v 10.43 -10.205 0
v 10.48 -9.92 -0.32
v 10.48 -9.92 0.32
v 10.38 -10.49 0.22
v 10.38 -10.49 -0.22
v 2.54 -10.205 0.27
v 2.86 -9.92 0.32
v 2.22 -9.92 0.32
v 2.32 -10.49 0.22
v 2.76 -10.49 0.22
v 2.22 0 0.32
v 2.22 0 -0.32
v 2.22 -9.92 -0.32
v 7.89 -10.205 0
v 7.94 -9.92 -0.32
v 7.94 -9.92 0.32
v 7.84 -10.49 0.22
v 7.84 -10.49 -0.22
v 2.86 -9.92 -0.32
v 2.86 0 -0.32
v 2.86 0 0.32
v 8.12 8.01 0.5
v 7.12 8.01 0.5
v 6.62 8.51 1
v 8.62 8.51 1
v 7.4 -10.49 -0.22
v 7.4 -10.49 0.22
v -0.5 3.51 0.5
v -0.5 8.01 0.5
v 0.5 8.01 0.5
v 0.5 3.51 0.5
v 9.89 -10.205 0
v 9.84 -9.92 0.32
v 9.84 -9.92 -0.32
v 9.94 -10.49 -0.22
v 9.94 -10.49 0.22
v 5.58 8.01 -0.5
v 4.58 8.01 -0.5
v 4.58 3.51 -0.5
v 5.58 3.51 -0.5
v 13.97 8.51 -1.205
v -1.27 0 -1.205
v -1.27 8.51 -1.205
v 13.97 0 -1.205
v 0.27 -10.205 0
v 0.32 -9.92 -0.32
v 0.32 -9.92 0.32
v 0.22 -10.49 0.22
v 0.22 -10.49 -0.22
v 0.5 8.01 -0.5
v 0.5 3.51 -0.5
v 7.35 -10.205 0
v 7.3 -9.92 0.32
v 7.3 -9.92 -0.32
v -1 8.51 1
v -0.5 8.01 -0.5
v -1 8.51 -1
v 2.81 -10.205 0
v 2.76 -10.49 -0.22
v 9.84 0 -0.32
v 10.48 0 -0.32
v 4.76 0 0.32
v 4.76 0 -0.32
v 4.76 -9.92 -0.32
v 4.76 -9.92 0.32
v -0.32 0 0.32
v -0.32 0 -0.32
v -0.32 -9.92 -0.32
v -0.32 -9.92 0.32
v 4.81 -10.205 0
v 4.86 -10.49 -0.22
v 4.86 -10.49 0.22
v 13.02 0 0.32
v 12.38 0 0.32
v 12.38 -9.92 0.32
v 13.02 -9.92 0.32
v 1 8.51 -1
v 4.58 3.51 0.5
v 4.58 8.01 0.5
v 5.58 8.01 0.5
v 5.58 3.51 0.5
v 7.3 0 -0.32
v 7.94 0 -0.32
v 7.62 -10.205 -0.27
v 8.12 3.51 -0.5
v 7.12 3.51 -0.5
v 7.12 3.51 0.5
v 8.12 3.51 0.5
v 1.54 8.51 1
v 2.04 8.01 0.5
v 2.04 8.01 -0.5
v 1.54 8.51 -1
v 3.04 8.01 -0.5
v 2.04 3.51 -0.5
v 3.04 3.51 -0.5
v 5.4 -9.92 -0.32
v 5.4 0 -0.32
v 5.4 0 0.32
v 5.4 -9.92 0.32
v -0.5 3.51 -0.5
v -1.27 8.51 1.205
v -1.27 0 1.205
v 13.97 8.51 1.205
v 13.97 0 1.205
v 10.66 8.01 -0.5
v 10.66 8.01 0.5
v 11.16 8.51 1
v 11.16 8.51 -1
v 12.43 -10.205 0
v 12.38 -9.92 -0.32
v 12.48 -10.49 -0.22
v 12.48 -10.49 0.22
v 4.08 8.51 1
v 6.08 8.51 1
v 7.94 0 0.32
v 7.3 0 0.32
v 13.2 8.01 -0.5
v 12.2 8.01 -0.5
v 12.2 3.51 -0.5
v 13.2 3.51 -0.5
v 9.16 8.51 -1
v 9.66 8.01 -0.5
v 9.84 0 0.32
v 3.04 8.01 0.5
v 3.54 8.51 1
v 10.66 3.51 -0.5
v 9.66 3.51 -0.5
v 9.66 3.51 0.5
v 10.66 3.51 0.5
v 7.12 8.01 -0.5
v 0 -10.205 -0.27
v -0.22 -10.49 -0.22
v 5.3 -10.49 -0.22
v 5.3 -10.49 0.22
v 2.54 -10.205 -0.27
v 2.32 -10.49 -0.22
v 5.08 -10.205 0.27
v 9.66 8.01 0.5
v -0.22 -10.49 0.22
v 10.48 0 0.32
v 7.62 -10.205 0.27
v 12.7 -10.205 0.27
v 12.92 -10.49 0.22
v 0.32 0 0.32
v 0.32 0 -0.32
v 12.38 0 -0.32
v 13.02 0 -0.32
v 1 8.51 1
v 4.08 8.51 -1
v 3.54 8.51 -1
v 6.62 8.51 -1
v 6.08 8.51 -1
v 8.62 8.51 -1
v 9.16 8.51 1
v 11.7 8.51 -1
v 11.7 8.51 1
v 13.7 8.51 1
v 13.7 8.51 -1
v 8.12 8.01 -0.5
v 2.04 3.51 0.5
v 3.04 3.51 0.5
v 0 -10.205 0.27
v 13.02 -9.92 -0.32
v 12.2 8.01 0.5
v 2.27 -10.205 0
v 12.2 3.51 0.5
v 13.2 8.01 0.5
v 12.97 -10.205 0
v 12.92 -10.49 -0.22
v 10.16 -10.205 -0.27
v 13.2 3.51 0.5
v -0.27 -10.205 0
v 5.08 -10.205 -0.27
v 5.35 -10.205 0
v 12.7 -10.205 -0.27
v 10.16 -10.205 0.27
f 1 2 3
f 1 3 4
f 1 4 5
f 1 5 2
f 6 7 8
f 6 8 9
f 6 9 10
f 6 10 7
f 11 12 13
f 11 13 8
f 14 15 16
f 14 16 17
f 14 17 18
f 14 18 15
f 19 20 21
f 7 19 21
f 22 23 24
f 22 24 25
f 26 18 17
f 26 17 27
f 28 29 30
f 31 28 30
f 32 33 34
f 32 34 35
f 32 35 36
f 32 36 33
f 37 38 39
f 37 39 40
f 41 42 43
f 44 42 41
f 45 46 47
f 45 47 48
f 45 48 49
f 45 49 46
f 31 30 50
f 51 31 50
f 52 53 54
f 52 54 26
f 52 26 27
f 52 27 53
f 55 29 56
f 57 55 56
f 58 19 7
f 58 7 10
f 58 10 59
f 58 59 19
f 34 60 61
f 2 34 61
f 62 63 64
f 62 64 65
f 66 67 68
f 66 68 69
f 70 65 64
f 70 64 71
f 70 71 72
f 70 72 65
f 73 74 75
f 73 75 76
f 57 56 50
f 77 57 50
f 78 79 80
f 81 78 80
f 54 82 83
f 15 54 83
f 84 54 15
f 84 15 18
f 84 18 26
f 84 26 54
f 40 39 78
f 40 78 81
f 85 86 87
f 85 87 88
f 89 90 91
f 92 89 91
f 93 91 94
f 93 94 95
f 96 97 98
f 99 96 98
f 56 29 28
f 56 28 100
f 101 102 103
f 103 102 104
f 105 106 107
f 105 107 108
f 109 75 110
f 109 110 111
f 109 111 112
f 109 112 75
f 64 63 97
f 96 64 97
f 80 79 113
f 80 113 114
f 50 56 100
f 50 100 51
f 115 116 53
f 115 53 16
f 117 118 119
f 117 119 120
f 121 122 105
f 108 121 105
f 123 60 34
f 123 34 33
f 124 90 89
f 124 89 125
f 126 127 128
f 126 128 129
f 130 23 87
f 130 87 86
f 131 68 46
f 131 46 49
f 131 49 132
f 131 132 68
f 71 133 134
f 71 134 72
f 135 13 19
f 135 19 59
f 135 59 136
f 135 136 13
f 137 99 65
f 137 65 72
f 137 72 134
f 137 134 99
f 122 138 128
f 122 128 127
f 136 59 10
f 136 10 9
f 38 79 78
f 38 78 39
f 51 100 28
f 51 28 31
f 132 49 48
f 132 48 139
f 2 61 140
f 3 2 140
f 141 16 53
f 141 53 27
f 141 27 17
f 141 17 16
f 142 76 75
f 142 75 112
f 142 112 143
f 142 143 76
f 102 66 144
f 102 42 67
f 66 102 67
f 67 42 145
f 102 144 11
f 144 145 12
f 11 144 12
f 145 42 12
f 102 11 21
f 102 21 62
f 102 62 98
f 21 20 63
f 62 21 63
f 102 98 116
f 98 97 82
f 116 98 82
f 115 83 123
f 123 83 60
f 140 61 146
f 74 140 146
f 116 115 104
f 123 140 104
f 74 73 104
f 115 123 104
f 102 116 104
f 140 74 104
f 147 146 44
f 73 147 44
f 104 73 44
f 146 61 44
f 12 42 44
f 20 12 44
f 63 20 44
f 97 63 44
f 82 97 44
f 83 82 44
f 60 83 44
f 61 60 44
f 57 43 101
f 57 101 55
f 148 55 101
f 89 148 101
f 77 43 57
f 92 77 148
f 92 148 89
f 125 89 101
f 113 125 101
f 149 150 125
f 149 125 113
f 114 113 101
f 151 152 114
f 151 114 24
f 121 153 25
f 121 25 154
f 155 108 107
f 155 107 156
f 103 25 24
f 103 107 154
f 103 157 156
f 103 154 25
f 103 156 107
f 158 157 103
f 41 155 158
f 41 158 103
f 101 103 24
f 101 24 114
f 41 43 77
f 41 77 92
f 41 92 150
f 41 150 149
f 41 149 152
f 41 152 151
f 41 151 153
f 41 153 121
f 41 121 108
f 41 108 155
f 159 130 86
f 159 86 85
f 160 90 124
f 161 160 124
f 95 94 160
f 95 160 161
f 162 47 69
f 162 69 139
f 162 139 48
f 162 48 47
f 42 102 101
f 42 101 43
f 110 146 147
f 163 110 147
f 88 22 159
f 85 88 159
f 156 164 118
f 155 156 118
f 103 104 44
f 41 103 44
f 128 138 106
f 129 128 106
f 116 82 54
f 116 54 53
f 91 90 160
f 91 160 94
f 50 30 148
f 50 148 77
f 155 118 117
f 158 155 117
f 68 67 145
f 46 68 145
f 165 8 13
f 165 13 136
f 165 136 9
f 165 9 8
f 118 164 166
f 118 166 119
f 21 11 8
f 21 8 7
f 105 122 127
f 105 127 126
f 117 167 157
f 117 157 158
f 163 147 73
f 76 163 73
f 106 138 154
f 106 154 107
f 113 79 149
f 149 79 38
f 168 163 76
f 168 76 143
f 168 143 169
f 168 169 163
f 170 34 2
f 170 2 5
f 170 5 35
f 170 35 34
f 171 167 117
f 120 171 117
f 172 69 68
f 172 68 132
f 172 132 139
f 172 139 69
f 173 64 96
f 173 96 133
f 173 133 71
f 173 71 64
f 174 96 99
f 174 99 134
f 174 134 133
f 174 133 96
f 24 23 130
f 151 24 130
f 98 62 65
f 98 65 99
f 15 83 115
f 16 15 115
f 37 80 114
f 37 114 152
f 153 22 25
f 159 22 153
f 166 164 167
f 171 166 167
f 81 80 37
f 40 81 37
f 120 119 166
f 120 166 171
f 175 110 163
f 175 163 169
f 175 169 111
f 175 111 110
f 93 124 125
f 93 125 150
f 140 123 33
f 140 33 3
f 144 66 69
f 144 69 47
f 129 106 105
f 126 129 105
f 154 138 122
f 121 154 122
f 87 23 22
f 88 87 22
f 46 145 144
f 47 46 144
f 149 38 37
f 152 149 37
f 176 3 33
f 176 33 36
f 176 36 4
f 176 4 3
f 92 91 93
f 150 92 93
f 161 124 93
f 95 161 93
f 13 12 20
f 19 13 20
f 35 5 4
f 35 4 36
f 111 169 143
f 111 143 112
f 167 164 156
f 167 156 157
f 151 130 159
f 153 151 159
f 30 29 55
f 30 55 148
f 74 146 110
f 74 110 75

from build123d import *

# Parameters (mm, degrees)
SKETCH2_W                  = 15.24
SKETCH2_H                  = 2.41
BOSS_EXTRUDE1_DEPTH        = 8.51
SKETCH5_W                  = 1
SKETCH5_H                  = 1
CUT_EXTRUDE1_DEPTH         = 5
CHAMFER1_SIZE              = 0.5
LPATTERN3_COUNT            = 6
LPATTERN3_PITCH            = 2.54
CHAMFER1_OF_LPATTERN3_SIZE = 0.5
SKETCH11_W                 = 0.64
SKETCH11_H                 = 0.64
BOSS_EXTRUDE2_DEPTH        = 9.92
LPATTERN4_COUNT            = 6
LPATTERN4_PITCH            = 2.54


with BuildPart() as part:
    # Sketch2 → Boss-Extrude1 (new body)
    with BuildSketch(Plane(origin=(0, 0, 0), x_dir=(1, 0, 0), z_dir=(0, 1, 0))):
        with Locations((6.35, 0)):
            Rectangle(SKETCH2_W, SKETCH2_H)
    extrude(amount=BOSS_EXTRUDE1_DEPTH)

    # Sketch5 → Cut-Extrude1 (cut)
    with BuildSketch(Plane(origin=(0, 8.51, 0), x_dir=(1, 0, 0), z_dir=(0, 1, 0))):
        Rectangle(SKETCH5_W, SKETCH5_H)
    cut_extrude1 = extrude(amount=-CUT_EXTRUDE1_DEPTH, mode=Mode.SUBTRACT)

    # Chamfer1
    chamfer1_edges = [part.edges().sort_by_distance(p)[0] for p in [
        (0.5, 8.51, 0),
        (0, 8.51, -0.5),
        (-0.5, 8.51, 0),
        (0, 8.51, 0.5),
    ]]
    chamfer(chamfer1_edges, length=CHAMFER1_SIZE)

    # LPattern3: Cut-Extrude1 ×6
    with Locations(*[(i * LPATTERN3_PITCH, 0, 0) for i in range(1, LPATTERN3_COUNT)]):
        add(cut_extrude1, mode=Mode.SUBTRACT)

    # Chamfer1 of LPattern3
    chamfer1_of_lpattern3_edges = [part.edges().sort_by_distance(p)[0] for p in [
        (3.04, 8.51, 0),
        (2.54, 8.51, -0.5),
        (2.04, 8.51, 0),
        (2.54, 8.51, 0.5),
        (5.58, 8.51, 0),
        (5.08, 8.51, -0.5),
        (4.58, 8.51, 0),
        (5.08, 8.51, 0.5),
        (8.12, 8.51, 0),
        (7.62, 8.51, -0.5),
        (7.12, 8.51, 0),
        (7.62, 8.51, 0.5),
        (10.66, 8.51, 0),
        (10.16, 8.51, -0.5),
        (9.66, 8.51, 0),
        (10.16, 8.51, 0.5),
        (13.2, 8.51, 0),
        (12.7, 8.51, -0.5),
        (12.2, 8.51, 0),
        (12.7, 8.51, 0.5),
    ]]
    chamfer(chamfer1_of_lpattern3_edges, length=CHAMFER1_OF_LPATTERN3_SIZE)

    # Sketch11 → Boss-Extrude2 (add)
    with BuildSketch(Plane.XZ):
        Rectangle(SKETCH11_W, SKETCH11_H)
    boss_extrude2 = extrude(amount=BOSS_EXTRUDE2_DEPTH)

    # Sketch13 → Loft1 section 0
    with BuildSketch(Plane.XZ.offset(9.92)):
        with BuildLine():
            Line((0.32, -0.32), (0.32, 0.32))
            Line((0.32, 0.32), (-0.32, 0.32))
            Line((-0.32, 0.32), (-0.32, -0.32))
            Line((-0.32, -0.32), (0.32, -0.32))
        make_face()
    # Sketch14 → Loft1 section 1
    with BuildSketch(Plane(origin=(0, -10.49, 0), x_dir=(-1, 0, 0), z_dir=(0, -1, 0))):
        with BuildLine():
            Line((-0.22, 0.22), (0.22, 0.22))
            Line((0.22, 0.22), (0.22, -0.22))
            Line((0.22, -0.22), (-0.22, -0.22))
            Line((-0.22, -0.22), (-0.22, 0.22))
        make_face()
    loft1 = loft()

    # LPattern4: Boss-Extrude2, Loft1 ×6
    with Locations(*[(i * LPATTERN4_PITCH, 0, 0) for i in range(1, LPATTERN4_COUNT)]):
        add(boss_extrude2)
        add(loft1)


solid = part.part
